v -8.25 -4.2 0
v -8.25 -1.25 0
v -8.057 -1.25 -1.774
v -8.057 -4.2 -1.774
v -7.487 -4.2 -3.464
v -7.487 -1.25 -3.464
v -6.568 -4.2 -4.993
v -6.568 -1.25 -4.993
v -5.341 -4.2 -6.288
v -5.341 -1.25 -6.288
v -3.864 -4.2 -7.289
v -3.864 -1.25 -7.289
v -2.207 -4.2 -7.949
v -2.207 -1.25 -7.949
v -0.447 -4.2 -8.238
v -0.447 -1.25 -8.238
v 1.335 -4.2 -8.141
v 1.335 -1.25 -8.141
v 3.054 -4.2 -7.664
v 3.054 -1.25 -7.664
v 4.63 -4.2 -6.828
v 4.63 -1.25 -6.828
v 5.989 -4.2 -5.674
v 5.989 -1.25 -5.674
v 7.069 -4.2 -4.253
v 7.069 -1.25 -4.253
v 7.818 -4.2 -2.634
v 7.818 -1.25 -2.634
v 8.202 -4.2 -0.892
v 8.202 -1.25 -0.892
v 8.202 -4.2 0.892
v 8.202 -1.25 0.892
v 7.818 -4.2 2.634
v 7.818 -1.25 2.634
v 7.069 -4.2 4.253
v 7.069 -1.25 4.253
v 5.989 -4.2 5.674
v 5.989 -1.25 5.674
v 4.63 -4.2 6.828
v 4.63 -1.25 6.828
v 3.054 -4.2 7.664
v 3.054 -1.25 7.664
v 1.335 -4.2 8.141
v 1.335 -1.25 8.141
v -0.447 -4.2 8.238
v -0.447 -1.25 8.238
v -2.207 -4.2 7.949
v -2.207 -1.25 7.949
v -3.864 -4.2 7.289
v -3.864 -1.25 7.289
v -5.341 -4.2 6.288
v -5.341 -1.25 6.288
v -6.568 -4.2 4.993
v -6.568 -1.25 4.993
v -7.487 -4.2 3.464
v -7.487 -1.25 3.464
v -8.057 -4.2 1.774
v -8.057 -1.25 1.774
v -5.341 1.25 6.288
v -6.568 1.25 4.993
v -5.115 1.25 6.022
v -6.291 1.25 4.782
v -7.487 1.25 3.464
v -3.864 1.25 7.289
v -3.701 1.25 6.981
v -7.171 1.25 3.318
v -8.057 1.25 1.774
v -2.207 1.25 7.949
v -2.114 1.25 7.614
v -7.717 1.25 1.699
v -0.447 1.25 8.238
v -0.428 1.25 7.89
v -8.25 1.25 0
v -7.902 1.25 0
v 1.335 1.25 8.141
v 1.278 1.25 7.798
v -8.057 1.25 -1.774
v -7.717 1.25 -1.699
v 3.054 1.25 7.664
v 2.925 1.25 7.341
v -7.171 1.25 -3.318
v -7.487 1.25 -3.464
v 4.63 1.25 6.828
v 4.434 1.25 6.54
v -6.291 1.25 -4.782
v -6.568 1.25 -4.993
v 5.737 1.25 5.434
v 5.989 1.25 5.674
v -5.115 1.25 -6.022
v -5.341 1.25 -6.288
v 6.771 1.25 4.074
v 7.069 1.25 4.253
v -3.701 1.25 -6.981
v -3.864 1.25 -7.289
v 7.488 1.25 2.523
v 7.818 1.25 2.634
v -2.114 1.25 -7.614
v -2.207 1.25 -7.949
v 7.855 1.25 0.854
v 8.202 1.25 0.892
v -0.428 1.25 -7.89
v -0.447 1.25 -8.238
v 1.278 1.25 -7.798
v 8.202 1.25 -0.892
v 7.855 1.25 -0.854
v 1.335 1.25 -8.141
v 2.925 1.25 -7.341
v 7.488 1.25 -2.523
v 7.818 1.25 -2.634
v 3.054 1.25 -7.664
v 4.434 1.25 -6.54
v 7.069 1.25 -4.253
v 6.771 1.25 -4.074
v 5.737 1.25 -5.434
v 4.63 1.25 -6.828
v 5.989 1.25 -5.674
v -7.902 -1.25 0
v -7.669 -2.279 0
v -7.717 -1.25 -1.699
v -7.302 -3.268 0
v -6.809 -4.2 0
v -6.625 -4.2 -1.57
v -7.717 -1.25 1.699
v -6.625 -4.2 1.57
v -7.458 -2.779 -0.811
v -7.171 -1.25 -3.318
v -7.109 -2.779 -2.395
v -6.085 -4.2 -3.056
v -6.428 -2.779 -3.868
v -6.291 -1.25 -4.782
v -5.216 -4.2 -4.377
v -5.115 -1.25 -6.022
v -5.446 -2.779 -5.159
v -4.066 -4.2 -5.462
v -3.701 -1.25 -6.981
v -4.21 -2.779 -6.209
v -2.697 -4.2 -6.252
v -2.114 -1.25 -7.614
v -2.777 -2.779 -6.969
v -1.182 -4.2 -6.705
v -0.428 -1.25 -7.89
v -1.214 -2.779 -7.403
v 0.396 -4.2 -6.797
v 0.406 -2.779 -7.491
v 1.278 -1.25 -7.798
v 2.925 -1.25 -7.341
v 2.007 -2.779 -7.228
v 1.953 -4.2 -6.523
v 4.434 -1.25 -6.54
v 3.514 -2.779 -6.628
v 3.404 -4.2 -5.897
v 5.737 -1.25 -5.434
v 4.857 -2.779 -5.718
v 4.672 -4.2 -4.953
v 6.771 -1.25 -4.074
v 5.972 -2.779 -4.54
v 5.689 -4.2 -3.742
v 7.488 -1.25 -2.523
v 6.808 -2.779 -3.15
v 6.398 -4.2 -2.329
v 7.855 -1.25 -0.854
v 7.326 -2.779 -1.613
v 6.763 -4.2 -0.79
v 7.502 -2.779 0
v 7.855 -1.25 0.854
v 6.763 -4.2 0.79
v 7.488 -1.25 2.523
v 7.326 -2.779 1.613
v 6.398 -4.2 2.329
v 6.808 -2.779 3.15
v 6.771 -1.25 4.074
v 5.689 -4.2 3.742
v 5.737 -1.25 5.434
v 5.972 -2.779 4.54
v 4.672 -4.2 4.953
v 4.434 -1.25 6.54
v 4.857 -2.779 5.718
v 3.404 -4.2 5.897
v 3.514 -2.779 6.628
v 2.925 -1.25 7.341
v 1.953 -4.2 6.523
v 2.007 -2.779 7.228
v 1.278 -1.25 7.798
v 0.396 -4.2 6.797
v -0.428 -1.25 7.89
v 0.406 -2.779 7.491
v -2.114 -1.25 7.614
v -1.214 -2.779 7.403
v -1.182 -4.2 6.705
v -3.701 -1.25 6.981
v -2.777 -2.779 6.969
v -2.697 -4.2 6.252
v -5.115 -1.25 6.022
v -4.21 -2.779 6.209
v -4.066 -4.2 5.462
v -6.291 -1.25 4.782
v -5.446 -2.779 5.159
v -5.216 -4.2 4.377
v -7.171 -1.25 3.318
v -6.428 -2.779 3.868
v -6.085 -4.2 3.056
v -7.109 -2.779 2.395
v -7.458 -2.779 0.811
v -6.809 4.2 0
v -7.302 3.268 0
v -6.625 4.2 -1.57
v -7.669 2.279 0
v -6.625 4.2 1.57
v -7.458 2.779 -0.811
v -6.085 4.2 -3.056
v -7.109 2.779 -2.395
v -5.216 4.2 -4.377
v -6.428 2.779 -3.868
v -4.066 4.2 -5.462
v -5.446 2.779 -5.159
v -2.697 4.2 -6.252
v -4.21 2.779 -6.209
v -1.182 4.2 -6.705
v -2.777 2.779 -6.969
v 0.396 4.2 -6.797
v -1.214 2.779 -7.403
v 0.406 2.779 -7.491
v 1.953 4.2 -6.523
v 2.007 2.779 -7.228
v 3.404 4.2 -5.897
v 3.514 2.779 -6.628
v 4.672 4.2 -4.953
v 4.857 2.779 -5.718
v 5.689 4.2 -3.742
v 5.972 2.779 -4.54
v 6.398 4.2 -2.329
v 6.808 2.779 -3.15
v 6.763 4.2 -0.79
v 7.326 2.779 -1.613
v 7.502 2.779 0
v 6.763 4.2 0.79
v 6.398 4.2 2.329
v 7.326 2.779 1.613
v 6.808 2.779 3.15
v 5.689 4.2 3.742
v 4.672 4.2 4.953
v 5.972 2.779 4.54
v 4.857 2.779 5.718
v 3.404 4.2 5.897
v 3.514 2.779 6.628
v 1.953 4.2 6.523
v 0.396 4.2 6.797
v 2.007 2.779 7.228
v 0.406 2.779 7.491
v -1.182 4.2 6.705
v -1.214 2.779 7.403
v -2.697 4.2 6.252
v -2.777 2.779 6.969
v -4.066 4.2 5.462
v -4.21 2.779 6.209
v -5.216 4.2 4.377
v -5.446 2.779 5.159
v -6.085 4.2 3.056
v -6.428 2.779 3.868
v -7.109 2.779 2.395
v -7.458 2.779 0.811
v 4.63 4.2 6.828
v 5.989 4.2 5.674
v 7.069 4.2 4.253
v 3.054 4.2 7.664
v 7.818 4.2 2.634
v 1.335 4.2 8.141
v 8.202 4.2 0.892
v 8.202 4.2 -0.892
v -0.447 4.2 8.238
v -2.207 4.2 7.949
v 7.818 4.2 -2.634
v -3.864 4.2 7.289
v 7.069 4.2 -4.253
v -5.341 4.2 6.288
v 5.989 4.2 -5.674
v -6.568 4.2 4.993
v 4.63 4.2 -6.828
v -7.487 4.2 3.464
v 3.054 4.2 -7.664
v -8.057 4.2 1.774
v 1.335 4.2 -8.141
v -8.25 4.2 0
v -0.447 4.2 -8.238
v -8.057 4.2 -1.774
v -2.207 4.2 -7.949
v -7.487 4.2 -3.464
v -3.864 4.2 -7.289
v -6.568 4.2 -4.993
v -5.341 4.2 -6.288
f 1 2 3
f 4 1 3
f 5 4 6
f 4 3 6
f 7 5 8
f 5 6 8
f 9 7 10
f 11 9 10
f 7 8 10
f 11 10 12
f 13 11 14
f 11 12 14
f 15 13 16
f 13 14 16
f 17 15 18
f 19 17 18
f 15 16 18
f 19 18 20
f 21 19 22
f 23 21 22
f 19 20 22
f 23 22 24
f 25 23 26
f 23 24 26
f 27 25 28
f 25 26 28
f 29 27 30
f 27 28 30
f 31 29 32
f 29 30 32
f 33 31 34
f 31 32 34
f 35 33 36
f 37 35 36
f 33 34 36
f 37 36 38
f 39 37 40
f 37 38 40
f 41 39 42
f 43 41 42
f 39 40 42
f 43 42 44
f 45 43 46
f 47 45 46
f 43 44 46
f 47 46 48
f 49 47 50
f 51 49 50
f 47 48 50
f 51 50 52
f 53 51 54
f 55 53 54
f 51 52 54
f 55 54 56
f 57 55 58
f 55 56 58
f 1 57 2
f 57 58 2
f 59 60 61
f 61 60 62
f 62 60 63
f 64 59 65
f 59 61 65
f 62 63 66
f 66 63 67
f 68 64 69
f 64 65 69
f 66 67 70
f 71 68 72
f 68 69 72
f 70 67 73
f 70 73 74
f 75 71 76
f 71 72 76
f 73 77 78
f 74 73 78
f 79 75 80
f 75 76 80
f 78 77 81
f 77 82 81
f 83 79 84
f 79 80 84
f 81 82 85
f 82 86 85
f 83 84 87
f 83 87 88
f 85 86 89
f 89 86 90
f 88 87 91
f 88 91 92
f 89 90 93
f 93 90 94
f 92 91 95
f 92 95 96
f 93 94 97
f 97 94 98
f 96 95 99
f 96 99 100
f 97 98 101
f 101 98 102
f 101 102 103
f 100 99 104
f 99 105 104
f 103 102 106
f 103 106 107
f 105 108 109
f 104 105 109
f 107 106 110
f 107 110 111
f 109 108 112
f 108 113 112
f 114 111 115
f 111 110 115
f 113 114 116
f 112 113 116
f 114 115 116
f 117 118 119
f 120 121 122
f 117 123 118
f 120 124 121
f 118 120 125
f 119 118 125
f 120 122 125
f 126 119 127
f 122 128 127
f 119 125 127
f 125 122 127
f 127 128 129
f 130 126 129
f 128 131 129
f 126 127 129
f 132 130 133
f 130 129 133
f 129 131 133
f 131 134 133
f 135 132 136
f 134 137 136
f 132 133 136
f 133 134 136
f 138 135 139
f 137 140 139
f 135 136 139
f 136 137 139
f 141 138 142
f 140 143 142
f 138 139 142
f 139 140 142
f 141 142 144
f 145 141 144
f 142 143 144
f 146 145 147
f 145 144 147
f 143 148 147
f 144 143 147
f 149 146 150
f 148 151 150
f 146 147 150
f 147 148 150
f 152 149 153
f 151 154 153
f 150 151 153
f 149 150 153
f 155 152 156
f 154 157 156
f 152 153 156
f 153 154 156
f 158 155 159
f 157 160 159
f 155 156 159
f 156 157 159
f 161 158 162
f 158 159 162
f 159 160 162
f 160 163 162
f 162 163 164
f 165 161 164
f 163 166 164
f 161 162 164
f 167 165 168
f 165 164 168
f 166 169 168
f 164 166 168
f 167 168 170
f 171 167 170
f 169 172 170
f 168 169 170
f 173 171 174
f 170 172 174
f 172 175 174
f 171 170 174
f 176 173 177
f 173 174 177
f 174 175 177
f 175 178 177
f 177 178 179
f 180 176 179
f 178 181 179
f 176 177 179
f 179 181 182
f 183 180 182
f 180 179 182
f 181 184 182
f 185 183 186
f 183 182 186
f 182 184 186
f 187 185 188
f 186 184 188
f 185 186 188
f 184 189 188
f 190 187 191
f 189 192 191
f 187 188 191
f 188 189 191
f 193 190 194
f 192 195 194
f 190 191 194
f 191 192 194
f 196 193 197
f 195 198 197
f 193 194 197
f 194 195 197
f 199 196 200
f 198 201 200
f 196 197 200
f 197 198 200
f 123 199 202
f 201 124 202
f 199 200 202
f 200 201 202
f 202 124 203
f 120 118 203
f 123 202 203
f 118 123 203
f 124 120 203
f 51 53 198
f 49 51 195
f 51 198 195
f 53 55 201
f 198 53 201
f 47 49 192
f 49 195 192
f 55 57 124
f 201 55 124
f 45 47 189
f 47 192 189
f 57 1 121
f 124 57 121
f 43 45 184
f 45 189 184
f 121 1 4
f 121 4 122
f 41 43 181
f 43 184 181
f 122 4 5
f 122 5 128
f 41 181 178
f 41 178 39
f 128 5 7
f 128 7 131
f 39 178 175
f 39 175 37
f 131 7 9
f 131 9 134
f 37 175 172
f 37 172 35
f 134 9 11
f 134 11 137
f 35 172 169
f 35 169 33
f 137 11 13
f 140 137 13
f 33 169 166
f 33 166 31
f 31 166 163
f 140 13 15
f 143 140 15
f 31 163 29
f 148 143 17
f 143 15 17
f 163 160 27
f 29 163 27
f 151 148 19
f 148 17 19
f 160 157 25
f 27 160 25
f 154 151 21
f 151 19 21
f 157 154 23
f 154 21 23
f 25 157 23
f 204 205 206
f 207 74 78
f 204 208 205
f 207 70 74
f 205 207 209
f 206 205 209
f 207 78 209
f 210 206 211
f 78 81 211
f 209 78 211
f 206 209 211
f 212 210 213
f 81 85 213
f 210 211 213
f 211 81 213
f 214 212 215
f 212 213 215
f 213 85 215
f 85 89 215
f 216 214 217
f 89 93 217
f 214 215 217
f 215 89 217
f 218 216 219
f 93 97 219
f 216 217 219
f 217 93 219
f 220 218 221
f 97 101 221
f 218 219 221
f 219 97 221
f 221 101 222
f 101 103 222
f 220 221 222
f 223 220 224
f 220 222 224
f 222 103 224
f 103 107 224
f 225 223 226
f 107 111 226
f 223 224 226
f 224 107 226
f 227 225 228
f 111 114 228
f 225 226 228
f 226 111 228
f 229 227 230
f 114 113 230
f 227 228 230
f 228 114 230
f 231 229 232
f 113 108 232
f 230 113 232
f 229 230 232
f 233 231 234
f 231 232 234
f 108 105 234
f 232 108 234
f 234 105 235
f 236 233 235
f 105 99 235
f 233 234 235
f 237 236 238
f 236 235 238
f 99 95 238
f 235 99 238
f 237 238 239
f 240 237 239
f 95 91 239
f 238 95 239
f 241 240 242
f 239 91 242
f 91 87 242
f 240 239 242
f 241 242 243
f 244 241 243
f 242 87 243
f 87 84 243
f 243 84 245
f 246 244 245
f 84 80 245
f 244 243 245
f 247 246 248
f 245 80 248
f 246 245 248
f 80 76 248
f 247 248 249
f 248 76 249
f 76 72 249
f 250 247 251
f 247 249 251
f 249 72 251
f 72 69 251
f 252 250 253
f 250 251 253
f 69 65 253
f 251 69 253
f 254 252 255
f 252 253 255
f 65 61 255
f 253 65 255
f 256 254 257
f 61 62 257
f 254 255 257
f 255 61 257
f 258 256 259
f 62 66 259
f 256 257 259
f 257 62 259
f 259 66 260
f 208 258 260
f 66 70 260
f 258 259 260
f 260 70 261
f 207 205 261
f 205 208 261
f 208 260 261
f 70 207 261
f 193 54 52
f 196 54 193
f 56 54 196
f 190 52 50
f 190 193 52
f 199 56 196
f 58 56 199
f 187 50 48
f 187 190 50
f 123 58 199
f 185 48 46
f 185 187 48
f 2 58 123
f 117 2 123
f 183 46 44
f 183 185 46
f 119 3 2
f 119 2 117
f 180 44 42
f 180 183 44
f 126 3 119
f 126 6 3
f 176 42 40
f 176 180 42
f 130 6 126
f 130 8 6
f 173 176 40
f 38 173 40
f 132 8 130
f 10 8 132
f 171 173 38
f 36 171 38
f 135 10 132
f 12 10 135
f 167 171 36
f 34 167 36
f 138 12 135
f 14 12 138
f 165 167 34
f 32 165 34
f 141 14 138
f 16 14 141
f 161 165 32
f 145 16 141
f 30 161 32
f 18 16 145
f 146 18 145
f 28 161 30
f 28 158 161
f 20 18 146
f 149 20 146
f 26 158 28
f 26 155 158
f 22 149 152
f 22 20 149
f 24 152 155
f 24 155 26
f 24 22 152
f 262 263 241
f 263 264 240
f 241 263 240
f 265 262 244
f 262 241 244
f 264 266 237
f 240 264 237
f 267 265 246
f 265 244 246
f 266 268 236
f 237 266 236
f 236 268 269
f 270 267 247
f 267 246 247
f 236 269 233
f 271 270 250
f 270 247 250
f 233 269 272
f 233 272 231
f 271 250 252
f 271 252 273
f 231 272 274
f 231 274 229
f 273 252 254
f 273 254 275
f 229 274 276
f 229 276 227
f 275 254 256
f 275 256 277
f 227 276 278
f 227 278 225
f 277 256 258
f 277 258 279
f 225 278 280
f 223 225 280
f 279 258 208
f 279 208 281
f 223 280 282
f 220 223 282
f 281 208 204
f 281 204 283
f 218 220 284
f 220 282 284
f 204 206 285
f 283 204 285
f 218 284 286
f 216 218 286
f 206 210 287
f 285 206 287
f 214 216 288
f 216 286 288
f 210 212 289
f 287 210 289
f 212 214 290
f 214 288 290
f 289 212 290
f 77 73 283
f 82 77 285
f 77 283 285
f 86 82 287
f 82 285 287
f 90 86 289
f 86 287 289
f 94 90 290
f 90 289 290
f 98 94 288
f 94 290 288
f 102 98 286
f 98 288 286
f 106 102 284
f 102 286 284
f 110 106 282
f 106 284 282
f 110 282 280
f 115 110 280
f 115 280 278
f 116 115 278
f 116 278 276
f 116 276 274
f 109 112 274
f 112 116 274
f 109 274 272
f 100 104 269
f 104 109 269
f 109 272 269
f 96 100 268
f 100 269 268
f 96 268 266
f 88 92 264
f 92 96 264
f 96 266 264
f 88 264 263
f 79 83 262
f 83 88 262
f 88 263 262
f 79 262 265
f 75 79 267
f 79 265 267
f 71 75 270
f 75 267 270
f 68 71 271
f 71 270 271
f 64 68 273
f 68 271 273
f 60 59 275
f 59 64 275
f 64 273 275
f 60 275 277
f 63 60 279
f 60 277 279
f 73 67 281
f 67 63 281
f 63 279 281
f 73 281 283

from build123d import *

# Parameters (mm, degrees)
CUT_EXTRUDE1_DEPTH      = 13.400201611
CUT_EXTRUDE1_DEPTH_BACK = 13.400201611
SKETCH3_W               = 16.5
SKETCH3_H               = 2.5


with BuildPart() as part:
    # Sketch2 → Revolve1 (revolve)
    with BuildSketch(Plane.XY):
        with BuildLine():
            Line((-8.25, -4.2), (-8.25, 4.2))
            Line((-8.25, 4.2), (-6.808817812, 4.2))
            ThreePointArc((-6.808817812, 4.2), (-8, 0), (-6.808817812, -4.2))
            Line((-6.808817812, -4.2), (-8.25, -4.2))
        make_face()
    revolve(axis=Axis((0, 4.2, 0), (0, -1, 0)))

    # Sketch3 → Cut-Extrude1 (cut, two sides: drawn at the far end of the back side and taken through both)
    with BuildSketch(Plane.XY.offset(-CUT_EXTRUDE1_DEPTH_BACK)):
        Rectangle(SKETCH3_W, SKETCH3_H)
    extrude(amount=CUT_EXTRUDE1_DEPTH + CUT_EXTRUDE1_DEPTH_BACK, mode=Mode.SUBTRACT)


with BuildPart() as cut_extrude1_piece_1:
    # of the separate pieces the step leaves, piece 1, a body of its own (cut_extrude1_pieces)
    add(part.part.solids().sort_by_distance((-6.808817812, -4.2, 0))[0])


with BuildPart() as cut_extrude1_piece_2:
    # of the separate pieces the step leaves, piece 2, a body of its own (cut_extrude1_pieces)
    add(part.part.solids().sort_by_distance((-6.808817812, 4.2, 0))[0])


solid = Compound([cut_extrude1_piece_1.part, cut_extrude1_piece_2.part])
